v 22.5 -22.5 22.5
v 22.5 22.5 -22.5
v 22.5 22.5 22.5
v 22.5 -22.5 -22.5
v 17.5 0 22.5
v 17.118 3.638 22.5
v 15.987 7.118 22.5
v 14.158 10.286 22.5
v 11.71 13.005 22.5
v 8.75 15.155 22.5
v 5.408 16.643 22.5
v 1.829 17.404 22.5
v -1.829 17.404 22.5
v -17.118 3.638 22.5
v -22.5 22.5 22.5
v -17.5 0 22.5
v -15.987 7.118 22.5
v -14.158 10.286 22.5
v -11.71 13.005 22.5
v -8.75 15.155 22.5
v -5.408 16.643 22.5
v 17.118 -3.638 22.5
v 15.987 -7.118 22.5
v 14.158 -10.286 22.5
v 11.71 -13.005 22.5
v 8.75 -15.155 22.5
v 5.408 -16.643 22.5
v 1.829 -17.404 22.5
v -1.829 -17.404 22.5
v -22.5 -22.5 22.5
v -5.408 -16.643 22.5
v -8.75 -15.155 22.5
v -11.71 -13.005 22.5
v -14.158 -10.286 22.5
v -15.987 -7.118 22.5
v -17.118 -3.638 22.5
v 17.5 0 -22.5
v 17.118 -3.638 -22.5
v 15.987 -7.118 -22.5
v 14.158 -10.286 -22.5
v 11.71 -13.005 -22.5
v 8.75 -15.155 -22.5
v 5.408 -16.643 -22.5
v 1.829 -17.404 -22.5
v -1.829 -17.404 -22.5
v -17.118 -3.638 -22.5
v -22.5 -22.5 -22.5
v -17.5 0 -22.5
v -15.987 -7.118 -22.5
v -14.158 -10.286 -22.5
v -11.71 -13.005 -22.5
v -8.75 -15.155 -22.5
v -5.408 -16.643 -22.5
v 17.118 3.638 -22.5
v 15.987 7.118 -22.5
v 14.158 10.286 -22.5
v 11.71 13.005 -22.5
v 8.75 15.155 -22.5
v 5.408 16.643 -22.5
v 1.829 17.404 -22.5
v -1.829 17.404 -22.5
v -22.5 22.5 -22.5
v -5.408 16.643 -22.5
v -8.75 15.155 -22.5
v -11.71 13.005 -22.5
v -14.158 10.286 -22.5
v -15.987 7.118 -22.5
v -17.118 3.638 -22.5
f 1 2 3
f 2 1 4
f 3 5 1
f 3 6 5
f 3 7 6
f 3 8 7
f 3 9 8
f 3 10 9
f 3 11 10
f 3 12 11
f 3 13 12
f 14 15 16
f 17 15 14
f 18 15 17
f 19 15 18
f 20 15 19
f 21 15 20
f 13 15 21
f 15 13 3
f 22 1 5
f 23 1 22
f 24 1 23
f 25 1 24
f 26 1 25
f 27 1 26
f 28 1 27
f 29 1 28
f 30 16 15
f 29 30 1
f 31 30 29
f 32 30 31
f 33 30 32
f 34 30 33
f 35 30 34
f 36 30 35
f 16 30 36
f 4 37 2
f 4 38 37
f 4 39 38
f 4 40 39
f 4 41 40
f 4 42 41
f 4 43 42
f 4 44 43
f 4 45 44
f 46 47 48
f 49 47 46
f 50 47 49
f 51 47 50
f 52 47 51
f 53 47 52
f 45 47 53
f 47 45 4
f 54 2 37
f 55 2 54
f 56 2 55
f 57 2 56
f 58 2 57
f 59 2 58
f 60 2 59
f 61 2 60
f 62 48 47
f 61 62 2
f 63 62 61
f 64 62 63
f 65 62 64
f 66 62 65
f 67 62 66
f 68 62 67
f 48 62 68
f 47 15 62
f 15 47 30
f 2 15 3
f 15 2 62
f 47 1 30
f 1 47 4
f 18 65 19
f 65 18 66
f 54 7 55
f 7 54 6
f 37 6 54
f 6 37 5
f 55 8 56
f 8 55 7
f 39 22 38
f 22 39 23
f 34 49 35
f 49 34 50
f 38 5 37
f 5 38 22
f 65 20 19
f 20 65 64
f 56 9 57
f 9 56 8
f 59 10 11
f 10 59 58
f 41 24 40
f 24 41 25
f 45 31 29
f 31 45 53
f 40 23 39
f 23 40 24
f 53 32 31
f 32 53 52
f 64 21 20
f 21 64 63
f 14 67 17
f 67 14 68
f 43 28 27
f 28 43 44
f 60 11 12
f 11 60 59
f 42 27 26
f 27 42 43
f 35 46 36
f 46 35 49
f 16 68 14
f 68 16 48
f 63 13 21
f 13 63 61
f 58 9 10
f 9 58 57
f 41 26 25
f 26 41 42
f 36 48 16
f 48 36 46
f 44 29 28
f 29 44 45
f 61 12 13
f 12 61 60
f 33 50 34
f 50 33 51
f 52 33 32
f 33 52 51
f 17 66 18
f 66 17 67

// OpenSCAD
difference()
{
  cube(45,center=true);
  translate([0,0,-25]) cylinder(h=50,d=35);
}
